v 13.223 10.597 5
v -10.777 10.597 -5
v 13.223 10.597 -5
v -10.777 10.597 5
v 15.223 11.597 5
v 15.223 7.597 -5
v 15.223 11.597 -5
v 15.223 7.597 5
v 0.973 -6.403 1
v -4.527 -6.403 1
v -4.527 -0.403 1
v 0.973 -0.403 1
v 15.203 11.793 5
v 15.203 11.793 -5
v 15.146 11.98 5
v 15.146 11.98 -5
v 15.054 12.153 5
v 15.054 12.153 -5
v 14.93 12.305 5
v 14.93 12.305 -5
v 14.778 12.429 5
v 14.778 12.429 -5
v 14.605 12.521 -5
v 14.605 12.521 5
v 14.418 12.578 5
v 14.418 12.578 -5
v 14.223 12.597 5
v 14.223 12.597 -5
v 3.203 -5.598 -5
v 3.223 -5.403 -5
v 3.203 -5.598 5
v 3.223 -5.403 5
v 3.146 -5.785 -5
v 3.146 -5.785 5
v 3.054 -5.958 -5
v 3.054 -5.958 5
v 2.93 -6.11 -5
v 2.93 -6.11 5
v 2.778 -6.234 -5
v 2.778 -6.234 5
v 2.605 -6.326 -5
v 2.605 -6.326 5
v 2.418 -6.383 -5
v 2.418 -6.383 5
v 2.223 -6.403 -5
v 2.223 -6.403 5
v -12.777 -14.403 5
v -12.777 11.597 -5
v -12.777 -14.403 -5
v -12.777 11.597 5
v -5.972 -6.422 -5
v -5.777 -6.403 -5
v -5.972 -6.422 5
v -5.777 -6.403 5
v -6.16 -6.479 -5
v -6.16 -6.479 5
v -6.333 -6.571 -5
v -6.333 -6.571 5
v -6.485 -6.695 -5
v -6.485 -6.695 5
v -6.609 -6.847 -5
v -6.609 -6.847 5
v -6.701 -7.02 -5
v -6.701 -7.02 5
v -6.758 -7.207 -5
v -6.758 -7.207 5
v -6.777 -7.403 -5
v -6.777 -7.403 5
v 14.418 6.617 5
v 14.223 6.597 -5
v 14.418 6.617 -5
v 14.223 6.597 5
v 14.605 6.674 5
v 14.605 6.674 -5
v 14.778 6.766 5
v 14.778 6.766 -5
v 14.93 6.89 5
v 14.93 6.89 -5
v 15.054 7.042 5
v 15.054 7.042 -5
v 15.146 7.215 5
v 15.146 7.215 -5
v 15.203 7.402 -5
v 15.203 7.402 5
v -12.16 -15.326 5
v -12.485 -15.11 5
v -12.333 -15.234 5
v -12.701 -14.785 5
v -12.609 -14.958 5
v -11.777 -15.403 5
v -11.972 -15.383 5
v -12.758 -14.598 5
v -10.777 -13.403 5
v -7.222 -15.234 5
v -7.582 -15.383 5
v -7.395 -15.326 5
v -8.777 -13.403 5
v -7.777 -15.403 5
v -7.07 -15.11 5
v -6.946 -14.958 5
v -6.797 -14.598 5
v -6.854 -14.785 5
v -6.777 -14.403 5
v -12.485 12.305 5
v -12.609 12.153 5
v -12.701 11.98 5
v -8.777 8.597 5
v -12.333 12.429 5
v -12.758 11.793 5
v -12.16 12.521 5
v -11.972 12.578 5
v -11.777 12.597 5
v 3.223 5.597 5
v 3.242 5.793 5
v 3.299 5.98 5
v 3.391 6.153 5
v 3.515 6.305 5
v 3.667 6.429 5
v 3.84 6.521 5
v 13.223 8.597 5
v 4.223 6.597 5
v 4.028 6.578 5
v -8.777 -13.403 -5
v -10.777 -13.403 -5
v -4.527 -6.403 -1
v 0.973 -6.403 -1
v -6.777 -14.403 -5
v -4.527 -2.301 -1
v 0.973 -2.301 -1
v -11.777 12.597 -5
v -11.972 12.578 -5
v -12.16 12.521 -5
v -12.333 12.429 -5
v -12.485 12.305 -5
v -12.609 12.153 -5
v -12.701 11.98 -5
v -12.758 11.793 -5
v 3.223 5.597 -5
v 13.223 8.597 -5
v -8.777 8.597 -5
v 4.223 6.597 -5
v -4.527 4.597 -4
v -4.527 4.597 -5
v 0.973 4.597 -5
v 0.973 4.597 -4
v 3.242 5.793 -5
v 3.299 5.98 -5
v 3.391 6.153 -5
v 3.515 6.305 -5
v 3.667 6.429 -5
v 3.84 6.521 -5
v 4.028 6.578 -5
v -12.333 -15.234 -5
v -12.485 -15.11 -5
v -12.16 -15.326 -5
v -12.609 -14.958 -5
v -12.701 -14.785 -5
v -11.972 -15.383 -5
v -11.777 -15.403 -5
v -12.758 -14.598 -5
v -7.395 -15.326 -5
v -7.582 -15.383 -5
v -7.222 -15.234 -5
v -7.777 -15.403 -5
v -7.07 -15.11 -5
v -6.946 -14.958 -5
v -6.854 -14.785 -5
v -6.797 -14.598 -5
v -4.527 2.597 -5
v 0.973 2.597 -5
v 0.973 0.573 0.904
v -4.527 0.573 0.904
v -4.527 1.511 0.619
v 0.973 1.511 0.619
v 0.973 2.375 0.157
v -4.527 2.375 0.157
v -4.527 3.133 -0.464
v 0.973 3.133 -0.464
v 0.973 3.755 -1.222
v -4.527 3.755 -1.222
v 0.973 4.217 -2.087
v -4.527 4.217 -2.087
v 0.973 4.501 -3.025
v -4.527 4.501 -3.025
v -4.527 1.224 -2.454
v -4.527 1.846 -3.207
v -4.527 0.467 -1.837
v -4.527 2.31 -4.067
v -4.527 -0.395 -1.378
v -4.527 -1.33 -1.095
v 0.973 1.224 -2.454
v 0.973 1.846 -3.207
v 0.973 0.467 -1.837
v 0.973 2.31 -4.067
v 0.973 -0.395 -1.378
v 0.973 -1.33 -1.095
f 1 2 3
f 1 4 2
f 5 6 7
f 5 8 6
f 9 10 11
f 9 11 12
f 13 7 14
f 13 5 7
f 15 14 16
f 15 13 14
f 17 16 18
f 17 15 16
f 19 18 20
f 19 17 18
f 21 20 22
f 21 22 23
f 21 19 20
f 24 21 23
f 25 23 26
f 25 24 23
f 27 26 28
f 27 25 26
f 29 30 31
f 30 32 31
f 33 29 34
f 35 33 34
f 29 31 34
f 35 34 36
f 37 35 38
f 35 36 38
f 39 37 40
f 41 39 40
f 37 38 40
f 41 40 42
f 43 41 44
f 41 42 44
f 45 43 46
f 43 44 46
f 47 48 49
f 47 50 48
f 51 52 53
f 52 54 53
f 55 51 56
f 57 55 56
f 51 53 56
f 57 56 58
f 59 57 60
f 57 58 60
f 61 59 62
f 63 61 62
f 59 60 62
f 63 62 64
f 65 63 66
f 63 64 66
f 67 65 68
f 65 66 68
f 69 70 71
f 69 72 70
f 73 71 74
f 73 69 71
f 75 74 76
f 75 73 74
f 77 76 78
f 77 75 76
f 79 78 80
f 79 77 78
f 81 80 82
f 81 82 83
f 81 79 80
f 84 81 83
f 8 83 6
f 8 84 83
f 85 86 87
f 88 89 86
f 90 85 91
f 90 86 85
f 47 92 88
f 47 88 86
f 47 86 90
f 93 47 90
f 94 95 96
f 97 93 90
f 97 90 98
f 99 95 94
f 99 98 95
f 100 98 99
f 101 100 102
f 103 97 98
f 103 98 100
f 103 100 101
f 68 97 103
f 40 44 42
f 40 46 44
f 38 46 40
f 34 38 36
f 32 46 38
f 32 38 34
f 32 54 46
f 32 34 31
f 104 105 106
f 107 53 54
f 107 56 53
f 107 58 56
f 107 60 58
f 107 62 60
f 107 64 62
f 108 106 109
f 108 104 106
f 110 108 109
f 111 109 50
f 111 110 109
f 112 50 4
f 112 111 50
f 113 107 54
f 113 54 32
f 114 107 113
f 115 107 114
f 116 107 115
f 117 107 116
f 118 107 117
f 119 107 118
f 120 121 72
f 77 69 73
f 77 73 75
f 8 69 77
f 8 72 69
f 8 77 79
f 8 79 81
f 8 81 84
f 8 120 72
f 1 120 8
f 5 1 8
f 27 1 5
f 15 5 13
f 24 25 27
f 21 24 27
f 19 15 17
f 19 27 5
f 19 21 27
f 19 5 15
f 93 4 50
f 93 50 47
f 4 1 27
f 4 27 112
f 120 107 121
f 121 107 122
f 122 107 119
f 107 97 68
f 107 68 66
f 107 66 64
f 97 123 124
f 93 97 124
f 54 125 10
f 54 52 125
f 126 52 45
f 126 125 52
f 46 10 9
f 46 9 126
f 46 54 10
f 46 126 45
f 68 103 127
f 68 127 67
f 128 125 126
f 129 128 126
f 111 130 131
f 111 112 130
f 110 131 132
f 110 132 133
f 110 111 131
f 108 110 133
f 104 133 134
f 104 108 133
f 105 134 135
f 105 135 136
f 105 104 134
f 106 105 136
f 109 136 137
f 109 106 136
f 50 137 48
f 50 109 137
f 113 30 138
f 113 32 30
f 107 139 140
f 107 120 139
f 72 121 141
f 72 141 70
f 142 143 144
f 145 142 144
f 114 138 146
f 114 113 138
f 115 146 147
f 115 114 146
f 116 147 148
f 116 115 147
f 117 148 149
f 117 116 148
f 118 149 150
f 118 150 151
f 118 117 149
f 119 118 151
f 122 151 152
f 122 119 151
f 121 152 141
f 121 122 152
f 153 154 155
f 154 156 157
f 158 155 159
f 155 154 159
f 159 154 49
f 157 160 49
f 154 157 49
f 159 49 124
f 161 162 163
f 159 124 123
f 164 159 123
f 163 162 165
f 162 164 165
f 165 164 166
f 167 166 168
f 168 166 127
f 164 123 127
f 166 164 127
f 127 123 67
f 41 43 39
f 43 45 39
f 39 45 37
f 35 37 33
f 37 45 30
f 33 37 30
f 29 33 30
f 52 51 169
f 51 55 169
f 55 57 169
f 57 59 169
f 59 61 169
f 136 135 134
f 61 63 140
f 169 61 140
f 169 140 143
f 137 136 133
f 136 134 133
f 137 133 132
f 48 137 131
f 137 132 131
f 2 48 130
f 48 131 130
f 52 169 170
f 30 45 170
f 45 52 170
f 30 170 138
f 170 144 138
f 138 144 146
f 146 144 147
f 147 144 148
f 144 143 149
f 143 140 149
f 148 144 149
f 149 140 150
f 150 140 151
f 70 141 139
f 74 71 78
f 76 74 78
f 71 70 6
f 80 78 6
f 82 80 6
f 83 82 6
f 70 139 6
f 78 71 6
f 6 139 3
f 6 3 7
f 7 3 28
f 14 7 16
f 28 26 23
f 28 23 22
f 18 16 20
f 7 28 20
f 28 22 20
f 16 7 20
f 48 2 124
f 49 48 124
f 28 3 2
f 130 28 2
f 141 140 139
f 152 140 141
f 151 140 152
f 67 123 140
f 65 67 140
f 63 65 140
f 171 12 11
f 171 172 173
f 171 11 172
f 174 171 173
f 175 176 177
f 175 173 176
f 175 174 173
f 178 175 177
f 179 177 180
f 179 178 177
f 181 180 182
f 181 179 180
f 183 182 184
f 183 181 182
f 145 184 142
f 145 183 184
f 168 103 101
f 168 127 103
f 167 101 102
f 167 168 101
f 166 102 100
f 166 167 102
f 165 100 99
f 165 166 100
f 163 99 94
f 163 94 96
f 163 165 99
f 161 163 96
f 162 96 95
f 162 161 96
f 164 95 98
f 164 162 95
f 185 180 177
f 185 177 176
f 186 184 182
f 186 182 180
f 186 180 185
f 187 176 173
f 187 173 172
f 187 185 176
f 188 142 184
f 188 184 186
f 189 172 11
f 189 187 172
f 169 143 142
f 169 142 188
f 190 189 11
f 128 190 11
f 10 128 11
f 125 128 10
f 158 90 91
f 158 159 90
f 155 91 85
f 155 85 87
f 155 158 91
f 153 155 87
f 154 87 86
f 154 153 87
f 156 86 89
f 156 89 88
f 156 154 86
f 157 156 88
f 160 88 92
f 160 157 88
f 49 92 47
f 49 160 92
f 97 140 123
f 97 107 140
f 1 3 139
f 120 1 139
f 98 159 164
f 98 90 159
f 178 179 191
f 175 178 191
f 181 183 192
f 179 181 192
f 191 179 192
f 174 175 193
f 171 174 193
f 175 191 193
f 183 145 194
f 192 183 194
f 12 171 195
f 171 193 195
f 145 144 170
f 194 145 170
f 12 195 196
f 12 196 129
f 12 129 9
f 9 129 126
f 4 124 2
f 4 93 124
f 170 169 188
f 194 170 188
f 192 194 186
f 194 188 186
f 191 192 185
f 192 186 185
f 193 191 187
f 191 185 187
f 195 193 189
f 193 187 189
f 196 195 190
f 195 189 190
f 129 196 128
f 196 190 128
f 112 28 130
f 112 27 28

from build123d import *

# Parameters (mm, degrees)
F1_DEPTH    = 5
F2_W        = 10
F2_H        = 10
F3_DEPTH    = 13
F4_R        = 1
F5_W        = 5.5
F5_H        = 2
F7_DEPTH    = 11
F6_W        = 5.5
F6_H        = 2
F8_DEPTH    = 6
F9_T4_DEPTH = 30.5
F9_T7_DEPTH = 5.5


# Not quite as in the source:
# - a fillet or chamfer that OpenCascade refuses, or shapes differently, is made with other operations: its cross-section is extruded or revolved along the edge and cut away or added


with BuildPart() as f1:
    # F0 (on Top) → F1 (new body, symmetric)
    with BuildSketch(Plane.XY):
        Polygon((-6.777402997, 6.5974989831), (15.222597003, 6.5974989831), (15.222597003, 12.5974989831), (-12.777402997, 12.5974989831), (-12.777402997, -15.4025010169), (-6.777402997, -15.4025010169), align=None)
        Polygon((-8.777402997, -13.4025010169), (-10.777402997, -13.4025010169), (-10.777402997, 10.5974989831), (13.222597003, 10.5974989831), (13.222597003, 8.5974989831), (-8.777402997, 8.5974989831), align=None, mode=Mode.SUBTRACT)
    extrude(amount=F1_DEPTH, both=True)

    # F2 (on face) → F3 (join)
    with BuildSketch(Plane.XZ.offset(-6.5974989831)):
        with Locations((-1.777402997, 0)):
            Rectangle(F2_W, F2_H)
    extrude(amount=F3_DEPTH)

    # F4
    f4_edges = [f1.edges().sort_by_distance(p)[0] for p in [
        (3.222597, 6.597499, 0),
        (-12.777403, 12.597499, 0),
        (15.222597, 12.597499, 0),
        (15.222597, 6.597499, 0),
        (-12.777403, -15.402501, 0),
        (-6.777403, -15.402501, 0),
        (3.222597, -6.402501, 0),
        (-6.777403, -6.402501, 0),
    ]]
    fillet(f4_edges, radius=F4_R)

    # F5 (on face) → F7 (cut)
    with BuildSketch(Plane.XZ.offset(6.4025010169)):
        with Locations((-1.777402997, 0)):
            Rectangle(F5_W, F5_H)
    extrude(amount=-F7_DEPTH, mode=Mode.SUBTRACT)

    # F6 (on face) → F8 (cut, through all)
    with BuildSketch(Plane(origin=(0, 0, -5), x_dir=(1, 0, 0), z_dir=(0, 0, -1))):
        with Locations((-1.777402997, -3.5974989831)):
            Rectangle(F6_W, F6_H)
    extrude(amount=-F8_DEPTH, mode=Mode.SUBTRACT)

    # F9: fillet of radius 5 on 2 edges, made by hand


with BuildPart() as f9_tool2:
    # F9_s3 → F9_t4 (new body)
    with BuildSketch(Plane.YZ.offset(13.472597003)):
        with BuildLine():
            ThreePointArc((-0.4025010169, 1), (3.1330328891, -0.4644660941), (4.5974989831, -4))
            Line((4.5974989831, -4), (4.5974989831, 1))
            Line((4.5974989831, 1), (-0.4025010169, 1))
        make_face()
    extrude(amount=-F9_T4_DEPTH)

    split(bisect_by=Plane.YZ.offset(-8.777402997), keep=Keep.TOP)

    split(bisect_by=Plane.YZ.offset(3.222597003), keep=Keep.BOTTOM)


with BuildPart() as f1_1:
    add(f1.part)

    # F9_t1: union F9_tool2
    add(f9_tool2.part)

    # F9_s8 → F9_t7 (cut)
    with BuildSketch(Plane.YZ.offset(-4.527402997)):
        with BuildLine():
            ThreePointArc((2.5974989831, -5), (0.8607971577, -2.1270166538), (-2.3014805024, -1))
            Line((-2.3014805024, -1), (2.5974989831, -1))
            Line((2.5974989831, -1), (2.5974989831, -5))
        make_face()
    extrude(amount=F9_T7_DEPTH, mode=Mode.SUBTRACT)


solid = f1_1.part
